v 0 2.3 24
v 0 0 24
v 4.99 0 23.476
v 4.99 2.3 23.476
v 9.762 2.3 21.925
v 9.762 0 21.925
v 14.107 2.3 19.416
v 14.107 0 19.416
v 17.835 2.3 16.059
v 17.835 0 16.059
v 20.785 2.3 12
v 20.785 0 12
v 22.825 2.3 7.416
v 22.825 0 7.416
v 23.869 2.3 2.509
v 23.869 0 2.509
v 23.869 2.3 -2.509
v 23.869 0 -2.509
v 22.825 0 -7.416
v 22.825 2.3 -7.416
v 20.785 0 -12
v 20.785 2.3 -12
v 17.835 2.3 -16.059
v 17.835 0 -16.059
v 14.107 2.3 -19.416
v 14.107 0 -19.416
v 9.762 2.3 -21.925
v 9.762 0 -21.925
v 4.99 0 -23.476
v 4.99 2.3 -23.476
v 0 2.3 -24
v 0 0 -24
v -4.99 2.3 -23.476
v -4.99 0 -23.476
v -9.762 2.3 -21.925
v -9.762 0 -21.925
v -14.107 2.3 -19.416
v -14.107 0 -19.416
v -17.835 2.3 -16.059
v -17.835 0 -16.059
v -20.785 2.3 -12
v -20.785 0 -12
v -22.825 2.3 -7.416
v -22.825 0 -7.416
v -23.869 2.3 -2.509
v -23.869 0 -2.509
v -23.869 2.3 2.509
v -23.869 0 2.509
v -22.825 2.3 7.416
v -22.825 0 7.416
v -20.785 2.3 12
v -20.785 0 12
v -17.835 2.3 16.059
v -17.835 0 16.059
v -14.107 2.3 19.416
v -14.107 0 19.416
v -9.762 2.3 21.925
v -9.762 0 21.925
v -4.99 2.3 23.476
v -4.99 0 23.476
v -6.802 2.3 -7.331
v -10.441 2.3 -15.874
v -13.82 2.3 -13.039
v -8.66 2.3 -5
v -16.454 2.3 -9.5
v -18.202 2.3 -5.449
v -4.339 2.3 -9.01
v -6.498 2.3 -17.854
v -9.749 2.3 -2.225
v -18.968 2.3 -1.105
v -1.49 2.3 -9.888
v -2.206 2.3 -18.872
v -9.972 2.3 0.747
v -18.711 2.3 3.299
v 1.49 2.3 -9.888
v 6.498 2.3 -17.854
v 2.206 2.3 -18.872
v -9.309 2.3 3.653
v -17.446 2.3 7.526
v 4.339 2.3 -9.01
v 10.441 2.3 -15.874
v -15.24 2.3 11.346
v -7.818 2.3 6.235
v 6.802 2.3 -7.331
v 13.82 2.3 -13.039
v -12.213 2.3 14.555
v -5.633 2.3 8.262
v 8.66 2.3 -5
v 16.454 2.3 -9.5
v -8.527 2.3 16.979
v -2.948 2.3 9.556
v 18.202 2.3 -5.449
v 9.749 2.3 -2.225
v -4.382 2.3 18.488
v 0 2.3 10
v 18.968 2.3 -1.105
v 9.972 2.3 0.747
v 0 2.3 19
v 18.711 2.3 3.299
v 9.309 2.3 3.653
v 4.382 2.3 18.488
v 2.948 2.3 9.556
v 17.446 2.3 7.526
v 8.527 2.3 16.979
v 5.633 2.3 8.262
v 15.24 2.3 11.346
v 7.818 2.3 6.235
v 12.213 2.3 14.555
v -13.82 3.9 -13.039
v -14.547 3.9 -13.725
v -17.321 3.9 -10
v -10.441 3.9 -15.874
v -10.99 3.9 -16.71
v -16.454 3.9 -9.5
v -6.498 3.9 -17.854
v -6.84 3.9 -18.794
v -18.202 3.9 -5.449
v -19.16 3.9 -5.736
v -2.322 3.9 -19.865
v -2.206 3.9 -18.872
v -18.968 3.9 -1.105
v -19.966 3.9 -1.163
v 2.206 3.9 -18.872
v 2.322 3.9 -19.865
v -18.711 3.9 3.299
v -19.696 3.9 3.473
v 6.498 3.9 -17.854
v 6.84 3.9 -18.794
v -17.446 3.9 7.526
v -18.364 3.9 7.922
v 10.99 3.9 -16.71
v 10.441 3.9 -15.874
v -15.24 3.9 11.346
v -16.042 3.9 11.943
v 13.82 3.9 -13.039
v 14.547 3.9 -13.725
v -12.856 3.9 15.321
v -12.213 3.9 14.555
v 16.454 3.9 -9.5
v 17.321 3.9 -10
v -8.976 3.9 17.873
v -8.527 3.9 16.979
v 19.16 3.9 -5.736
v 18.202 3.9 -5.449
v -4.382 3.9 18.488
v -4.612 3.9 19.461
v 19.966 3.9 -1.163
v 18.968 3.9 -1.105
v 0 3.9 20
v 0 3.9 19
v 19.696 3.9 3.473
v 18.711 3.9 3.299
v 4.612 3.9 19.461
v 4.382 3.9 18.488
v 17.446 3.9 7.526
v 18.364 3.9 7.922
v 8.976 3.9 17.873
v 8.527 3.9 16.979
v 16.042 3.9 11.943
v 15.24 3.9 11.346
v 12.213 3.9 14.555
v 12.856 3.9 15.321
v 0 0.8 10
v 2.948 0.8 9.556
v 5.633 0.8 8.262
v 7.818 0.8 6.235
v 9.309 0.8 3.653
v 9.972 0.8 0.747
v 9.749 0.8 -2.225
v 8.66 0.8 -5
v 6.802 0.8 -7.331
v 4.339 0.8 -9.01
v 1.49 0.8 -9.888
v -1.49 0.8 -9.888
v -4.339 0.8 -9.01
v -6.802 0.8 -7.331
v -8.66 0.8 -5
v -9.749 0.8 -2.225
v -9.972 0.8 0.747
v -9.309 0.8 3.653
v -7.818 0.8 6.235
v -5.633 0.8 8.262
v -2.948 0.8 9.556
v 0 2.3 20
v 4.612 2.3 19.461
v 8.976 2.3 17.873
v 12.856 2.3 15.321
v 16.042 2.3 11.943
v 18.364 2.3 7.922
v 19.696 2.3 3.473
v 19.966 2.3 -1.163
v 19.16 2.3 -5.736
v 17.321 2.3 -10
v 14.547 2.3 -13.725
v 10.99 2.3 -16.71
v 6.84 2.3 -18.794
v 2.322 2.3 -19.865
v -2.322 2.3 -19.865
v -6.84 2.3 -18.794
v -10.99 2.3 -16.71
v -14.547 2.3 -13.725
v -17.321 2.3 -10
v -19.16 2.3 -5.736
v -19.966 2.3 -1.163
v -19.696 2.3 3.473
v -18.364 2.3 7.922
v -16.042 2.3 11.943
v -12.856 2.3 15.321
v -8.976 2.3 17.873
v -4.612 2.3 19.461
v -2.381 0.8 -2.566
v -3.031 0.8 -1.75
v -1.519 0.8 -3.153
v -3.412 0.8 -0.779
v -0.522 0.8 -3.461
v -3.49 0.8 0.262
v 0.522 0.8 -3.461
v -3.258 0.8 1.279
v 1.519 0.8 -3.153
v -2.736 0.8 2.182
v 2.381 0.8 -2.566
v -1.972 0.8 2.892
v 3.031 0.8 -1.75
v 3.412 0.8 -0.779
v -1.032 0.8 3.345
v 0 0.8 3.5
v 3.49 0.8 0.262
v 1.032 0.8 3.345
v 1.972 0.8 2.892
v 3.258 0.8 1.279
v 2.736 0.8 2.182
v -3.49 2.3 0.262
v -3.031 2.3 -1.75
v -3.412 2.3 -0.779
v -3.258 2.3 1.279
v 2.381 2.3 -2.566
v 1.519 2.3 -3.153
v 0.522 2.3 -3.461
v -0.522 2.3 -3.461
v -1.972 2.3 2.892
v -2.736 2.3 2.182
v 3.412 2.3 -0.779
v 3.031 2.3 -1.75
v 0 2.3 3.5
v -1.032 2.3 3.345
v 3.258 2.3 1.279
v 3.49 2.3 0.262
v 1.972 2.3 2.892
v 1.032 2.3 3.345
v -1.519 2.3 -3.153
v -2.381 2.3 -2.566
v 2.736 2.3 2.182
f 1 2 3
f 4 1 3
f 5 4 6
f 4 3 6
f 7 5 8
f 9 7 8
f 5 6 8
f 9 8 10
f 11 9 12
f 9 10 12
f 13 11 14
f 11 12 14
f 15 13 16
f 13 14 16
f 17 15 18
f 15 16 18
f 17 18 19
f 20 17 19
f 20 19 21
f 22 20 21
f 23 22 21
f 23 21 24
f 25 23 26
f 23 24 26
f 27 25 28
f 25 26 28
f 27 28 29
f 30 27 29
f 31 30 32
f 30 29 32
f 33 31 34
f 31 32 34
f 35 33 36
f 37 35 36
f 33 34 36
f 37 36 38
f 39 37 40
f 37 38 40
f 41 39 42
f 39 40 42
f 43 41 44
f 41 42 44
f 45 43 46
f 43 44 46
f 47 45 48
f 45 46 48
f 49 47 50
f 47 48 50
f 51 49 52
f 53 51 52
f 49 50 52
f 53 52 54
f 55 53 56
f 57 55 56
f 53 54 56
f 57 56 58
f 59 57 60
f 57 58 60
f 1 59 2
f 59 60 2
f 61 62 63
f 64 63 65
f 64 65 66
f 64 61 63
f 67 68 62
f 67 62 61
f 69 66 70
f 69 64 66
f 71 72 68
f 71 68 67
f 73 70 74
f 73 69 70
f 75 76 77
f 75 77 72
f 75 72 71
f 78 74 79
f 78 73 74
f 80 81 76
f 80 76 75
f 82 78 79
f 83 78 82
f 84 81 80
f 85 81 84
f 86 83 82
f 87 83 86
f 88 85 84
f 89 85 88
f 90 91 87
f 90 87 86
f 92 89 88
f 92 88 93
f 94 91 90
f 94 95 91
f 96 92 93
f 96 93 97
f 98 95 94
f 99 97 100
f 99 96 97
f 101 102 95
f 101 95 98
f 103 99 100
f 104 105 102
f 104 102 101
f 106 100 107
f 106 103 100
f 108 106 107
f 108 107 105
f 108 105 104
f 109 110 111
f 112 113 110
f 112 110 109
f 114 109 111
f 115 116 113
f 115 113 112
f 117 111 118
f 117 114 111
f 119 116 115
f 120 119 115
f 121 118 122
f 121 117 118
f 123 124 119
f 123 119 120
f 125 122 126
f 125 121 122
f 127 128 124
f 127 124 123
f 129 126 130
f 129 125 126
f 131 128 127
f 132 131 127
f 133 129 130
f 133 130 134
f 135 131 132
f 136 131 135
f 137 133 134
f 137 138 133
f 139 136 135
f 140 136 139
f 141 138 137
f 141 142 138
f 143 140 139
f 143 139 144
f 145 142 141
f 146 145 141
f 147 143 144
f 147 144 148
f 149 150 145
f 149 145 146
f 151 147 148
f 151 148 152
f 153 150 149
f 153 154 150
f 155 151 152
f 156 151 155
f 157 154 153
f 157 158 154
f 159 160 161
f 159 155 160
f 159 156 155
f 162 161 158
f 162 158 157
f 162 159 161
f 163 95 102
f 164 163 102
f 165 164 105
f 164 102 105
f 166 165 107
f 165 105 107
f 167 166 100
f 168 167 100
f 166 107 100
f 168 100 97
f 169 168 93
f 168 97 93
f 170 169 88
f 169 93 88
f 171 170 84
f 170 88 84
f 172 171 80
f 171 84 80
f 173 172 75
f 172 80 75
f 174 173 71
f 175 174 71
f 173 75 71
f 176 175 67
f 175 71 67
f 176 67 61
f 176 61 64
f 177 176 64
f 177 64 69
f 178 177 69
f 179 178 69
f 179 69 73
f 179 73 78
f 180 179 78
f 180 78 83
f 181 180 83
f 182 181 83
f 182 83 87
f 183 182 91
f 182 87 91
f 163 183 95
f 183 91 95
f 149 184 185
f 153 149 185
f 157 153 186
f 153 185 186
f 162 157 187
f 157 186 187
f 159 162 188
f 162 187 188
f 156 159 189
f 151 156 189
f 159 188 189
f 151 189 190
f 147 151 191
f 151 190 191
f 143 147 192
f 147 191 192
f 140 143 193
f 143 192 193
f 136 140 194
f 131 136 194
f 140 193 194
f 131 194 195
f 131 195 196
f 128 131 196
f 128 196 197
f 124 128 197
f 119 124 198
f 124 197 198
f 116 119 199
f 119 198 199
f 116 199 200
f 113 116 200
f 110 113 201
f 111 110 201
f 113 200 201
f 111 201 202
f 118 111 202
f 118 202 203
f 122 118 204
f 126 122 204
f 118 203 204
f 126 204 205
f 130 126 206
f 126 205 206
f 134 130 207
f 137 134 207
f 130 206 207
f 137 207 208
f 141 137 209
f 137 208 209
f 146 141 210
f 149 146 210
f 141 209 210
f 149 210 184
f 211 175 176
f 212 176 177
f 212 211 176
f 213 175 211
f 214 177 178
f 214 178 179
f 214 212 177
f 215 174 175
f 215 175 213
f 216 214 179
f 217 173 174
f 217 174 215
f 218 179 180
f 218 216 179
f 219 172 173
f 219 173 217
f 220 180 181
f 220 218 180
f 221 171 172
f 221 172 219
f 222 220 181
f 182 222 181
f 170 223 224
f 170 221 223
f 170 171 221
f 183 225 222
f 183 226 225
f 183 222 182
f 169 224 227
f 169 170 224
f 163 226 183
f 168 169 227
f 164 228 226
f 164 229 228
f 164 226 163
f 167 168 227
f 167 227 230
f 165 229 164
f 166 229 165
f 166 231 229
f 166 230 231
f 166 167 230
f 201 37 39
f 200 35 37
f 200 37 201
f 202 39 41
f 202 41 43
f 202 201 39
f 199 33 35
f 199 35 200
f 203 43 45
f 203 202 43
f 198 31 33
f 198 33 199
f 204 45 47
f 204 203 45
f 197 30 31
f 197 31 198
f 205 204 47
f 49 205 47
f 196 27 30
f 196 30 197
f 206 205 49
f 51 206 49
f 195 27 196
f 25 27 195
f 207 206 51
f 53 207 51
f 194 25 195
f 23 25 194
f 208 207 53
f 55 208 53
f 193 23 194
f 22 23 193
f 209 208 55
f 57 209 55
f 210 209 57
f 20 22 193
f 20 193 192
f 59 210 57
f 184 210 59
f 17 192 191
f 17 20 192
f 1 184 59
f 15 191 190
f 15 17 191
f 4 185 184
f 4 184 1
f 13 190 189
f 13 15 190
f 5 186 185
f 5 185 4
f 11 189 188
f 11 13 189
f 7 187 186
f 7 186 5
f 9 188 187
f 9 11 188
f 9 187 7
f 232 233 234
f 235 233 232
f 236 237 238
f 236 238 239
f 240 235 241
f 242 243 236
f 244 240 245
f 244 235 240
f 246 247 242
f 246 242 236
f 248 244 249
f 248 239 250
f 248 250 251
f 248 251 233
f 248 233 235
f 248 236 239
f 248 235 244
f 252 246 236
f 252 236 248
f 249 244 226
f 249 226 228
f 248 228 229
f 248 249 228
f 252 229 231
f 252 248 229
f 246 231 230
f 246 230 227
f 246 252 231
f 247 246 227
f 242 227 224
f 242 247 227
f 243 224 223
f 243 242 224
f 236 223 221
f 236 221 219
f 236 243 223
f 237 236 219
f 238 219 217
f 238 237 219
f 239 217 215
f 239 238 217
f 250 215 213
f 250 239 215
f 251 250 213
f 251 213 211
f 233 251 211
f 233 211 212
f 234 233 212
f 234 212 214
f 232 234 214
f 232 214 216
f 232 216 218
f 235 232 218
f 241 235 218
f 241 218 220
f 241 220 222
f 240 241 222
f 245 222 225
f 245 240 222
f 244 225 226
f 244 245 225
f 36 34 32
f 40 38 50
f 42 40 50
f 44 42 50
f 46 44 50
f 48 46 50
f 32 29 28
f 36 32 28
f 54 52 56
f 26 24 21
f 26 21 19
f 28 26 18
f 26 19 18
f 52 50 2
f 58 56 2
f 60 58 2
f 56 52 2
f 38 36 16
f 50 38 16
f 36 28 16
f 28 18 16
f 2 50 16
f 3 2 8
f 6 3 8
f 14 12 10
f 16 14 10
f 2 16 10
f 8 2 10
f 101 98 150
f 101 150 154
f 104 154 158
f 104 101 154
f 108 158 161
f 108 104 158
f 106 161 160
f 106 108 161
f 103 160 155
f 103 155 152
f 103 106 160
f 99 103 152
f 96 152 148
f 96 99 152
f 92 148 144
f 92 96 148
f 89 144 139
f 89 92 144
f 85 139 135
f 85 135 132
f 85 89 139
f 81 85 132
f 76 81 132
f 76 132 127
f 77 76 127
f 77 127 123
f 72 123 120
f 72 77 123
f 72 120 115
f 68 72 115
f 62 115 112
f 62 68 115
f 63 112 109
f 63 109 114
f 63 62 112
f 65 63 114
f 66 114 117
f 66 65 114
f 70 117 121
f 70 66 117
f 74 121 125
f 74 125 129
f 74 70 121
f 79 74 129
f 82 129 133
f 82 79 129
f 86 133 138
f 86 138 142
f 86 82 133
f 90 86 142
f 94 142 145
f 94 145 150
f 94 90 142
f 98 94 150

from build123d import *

# Parameters (mm, degrees)
SKETCH1_R           = 24
BOSS_EXTRUDE1_DEPTH = 2.3
SKETCH2_R           = 10
SKETCH2_R_2         = 3.5
CUT_EXTRUDE1_DEPTH  = 1.5
SKETCH3_R           = 20
SKETCH3_R_2         = 19
BOSS_EXTRUDE2_DEPTH = 1.6


with BuildPart() as part:
    # Sketch1 → Boss-Extrude1 (new body)
    with BuildSketch(Plane(origin=(0, 0, 0), x_dir=(1, 0, 0), z_dir=(0, 1, 0))):
        with Locations(Location((0, 0, 0), (0, 0, 270))):
            Circle(SKETCH1_R)
    extrude(amount=BOSS_EXTRUDE1_DEPTH)

    # Sketch2 → Cut-Extrude1 (cut)
    with BuildSketch(Plane(origin=(0, 2.3, 0), x_dir=(1, 0, 0), z_dir=(0, 1, 0))):
        with Locations(Location((0, 0, 0), (0, 0, 270))):
            Circle(SKETCH2_R)
        with Locations(Location((0, 0, 0), (0, 0, 270))):
            Circle(SKETCH2_R_2, mode=Mode.SUBTRACT)
    extrude(amount=-CUT_EXTRUDE1_DEPTH, mode=Mode.SUBTRACT)

    # Sketch3 → Boss-Extrude2 (add)
    with BuildSketch(Plane(origin=(0, 2.3, 0), x_dir=(1, 0, 0), z_dir=(0, 1, 0))):
        with Locations(Location((0, 0, 0), (0, 0, 270))):
            Circle(SKETCH3_R)
        with Locations(Location((0, 0, 0), (0, 0, 270))):
            Circle(SKETCH3_R_2, mode=Mode.SUBTRACT)
    extrude(amount=BOSS_EXTRUDE2_DEPTH)


solid = part.part
